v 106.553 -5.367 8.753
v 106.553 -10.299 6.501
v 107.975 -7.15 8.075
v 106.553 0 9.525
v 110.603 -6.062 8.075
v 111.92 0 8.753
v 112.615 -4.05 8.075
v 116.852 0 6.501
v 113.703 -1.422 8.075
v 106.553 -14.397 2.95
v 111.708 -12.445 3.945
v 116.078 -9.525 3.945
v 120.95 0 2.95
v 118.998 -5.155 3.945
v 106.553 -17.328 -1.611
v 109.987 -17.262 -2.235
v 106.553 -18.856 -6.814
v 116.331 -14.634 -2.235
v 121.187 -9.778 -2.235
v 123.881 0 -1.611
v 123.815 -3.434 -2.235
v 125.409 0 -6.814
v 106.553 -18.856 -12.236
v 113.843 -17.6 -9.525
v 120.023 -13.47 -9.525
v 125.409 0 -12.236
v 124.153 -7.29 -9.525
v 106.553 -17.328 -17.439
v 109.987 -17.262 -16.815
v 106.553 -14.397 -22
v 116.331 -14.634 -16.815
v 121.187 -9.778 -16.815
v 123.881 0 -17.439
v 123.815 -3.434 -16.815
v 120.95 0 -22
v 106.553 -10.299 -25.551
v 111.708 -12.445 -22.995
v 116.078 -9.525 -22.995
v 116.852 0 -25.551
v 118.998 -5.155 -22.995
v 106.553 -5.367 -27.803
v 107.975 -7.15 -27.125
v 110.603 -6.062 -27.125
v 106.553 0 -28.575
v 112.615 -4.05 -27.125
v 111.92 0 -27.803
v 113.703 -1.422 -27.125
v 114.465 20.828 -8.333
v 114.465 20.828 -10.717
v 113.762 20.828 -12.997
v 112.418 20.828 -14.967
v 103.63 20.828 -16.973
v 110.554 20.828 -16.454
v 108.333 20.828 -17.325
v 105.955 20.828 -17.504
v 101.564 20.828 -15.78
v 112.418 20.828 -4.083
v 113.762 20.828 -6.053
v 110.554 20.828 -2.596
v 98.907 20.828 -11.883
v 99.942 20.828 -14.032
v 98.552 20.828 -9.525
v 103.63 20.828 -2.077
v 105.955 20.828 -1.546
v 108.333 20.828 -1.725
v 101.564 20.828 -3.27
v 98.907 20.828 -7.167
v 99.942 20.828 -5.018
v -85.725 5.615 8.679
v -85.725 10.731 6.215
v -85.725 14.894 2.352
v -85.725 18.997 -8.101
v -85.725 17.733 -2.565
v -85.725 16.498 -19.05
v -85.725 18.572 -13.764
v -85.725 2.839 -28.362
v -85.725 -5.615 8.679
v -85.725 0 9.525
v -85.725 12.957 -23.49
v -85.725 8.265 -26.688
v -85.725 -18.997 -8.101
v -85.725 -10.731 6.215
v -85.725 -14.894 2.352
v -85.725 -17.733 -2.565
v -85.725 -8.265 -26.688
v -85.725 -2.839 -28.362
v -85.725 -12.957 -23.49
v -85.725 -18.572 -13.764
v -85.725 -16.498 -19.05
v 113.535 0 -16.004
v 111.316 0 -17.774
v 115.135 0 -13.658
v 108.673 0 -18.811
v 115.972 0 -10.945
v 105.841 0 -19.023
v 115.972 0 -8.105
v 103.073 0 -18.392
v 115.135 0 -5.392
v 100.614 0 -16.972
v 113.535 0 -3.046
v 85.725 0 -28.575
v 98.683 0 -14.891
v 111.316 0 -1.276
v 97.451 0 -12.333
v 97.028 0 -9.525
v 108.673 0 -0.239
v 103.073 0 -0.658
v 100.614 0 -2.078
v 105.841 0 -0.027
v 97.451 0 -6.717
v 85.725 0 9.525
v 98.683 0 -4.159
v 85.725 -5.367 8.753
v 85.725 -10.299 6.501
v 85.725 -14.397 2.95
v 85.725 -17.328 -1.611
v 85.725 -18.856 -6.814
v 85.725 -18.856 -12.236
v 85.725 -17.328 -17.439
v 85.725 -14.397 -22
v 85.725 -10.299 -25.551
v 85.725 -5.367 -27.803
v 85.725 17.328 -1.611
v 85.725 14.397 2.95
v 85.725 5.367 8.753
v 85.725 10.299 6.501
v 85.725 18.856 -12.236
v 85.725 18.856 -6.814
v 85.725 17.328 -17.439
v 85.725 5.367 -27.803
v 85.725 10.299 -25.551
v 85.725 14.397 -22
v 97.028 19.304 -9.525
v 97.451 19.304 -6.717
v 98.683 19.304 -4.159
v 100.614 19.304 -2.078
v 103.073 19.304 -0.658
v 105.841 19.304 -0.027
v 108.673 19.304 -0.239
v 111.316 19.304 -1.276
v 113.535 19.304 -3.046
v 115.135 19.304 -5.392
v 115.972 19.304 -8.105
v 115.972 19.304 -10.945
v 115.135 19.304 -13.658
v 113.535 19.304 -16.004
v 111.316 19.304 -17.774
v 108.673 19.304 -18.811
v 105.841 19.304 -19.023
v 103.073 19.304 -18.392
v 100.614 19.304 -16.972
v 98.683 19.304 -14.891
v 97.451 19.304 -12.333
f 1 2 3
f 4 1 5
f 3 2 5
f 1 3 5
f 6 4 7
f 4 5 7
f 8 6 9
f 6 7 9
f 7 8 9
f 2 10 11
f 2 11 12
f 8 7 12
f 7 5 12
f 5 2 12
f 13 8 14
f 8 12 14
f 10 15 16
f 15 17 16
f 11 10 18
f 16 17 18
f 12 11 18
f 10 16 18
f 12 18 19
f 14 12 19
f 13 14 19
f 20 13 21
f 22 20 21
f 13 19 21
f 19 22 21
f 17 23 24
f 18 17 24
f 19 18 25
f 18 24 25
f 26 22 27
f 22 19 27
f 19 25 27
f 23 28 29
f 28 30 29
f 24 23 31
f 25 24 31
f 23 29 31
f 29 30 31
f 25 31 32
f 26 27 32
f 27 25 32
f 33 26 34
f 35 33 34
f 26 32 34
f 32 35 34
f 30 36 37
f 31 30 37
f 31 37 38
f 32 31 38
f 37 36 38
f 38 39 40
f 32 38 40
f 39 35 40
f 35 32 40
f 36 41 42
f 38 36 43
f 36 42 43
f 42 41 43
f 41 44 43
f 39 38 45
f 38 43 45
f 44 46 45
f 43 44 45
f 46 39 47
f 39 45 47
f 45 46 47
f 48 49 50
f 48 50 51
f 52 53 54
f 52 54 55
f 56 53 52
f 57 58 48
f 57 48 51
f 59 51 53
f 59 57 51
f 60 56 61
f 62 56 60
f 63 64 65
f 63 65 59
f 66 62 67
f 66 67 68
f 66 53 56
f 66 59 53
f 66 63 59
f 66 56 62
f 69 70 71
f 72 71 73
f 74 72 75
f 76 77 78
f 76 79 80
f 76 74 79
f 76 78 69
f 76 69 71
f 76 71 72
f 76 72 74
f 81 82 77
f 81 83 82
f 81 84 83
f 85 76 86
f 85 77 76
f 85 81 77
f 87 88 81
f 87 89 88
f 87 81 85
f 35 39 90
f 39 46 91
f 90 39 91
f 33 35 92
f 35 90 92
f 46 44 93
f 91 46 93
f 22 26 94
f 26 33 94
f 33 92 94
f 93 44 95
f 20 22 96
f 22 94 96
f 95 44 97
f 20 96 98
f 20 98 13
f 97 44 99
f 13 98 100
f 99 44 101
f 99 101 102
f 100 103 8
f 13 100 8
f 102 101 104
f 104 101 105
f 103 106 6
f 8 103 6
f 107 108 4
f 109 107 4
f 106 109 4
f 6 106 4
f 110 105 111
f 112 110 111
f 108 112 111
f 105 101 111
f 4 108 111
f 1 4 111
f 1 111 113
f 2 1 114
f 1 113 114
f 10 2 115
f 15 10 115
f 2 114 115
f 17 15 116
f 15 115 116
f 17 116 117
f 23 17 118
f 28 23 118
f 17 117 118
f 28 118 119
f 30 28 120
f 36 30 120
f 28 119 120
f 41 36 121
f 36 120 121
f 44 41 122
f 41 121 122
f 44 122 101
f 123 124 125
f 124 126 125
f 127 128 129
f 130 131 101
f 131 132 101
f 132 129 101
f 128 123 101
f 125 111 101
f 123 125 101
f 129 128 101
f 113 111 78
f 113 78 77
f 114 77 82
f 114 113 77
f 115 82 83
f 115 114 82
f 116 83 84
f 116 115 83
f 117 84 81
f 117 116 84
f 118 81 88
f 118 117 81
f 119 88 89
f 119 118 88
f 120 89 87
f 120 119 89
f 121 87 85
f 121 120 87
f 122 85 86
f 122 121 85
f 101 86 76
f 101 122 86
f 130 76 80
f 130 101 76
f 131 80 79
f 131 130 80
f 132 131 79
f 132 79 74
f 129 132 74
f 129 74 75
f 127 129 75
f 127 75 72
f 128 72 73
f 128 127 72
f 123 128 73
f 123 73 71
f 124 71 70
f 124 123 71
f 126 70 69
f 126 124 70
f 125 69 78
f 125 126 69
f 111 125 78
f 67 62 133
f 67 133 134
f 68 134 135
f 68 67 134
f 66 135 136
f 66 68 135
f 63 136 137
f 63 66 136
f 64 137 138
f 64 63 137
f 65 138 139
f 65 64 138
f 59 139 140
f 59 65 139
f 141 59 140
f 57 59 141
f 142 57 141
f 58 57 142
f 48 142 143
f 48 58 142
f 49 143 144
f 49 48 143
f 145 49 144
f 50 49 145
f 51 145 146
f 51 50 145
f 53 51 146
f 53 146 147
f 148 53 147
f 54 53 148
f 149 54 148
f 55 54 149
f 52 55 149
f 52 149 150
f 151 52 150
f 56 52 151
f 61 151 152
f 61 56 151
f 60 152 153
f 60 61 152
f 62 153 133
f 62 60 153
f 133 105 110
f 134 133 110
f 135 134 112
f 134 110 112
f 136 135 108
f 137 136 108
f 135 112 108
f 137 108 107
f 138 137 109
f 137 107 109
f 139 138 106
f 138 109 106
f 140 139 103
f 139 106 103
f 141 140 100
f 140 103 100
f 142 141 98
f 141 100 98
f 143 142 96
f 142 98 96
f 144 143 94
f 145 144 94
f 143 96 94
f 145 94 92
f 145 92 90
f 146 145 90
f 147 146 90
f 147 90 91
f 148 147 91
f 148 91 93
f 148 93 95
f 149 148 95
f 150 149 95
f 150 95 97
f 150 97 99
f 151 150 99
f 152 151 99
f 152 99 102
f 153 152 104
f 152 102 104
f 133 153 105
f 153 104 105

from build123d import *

# Parameters (mm, degrees)
F0_W     = 171.45
F0_H     = 19.05
F3_DEPTH = 20.828
F5_ANGLE = 90
F6_R     = 9.525
F7_DEPTH = 20.828
F8_SIZE  = 1.524


with BuildPart() as f1:
    # F0 (on Front) → F1 (revolve)
    with BuildSketch(Plane.XZ):
        Rectangle(F0_W, F0_H)
    revolve(axis=Axis((0, 0, -9.525), (1, 0, 0)))

    # F2 (on face) → F3 (join)
    with BuildSketch(Plane.YZ.offset(85.725)):
        with BuildLine():
            Line((0, -28.575), (0, 9.525))
            ThreePointArc((0, 9.525), (-19.05, -9.525), (0, -28.575))
        make_face()
    extrude(amount=F3_DEPTH)

    # F4 (on face) → F5 (revolve)
    with BuildSketch(Plane.YZ.offset(106.553)):
        with BuildLine():
            ThreePointArc((0, 9.525), (-19.05, -9.525), (0, -28.575))
            Line((0, -28.575), (0, 9.525))
        make_face()
    revolve(axis=Axis((106.553, 0, -9.525), (0, 0, 1)), revolution_arc=F5_ANGLE)

    # F6 (on face) → F7 (join)
    with BuildSketch(Plane(origin=(0, 0, 0), x_dir=(-1, 0, 0), z_dir=(0, 1, 0))):
        with Locations((-106.553, -9.525)):
            Circle(F6_R)
    extrude(amount=F7_DEPTH)

    # F8
    f8_edges = [f1.edges().sort_by_distance(p)[0] for p in [
        (116.078, 20.828, -9.525),
    ]]
    chamfer(f8_edges, length=F8_SIZE)


solid = f1.part
